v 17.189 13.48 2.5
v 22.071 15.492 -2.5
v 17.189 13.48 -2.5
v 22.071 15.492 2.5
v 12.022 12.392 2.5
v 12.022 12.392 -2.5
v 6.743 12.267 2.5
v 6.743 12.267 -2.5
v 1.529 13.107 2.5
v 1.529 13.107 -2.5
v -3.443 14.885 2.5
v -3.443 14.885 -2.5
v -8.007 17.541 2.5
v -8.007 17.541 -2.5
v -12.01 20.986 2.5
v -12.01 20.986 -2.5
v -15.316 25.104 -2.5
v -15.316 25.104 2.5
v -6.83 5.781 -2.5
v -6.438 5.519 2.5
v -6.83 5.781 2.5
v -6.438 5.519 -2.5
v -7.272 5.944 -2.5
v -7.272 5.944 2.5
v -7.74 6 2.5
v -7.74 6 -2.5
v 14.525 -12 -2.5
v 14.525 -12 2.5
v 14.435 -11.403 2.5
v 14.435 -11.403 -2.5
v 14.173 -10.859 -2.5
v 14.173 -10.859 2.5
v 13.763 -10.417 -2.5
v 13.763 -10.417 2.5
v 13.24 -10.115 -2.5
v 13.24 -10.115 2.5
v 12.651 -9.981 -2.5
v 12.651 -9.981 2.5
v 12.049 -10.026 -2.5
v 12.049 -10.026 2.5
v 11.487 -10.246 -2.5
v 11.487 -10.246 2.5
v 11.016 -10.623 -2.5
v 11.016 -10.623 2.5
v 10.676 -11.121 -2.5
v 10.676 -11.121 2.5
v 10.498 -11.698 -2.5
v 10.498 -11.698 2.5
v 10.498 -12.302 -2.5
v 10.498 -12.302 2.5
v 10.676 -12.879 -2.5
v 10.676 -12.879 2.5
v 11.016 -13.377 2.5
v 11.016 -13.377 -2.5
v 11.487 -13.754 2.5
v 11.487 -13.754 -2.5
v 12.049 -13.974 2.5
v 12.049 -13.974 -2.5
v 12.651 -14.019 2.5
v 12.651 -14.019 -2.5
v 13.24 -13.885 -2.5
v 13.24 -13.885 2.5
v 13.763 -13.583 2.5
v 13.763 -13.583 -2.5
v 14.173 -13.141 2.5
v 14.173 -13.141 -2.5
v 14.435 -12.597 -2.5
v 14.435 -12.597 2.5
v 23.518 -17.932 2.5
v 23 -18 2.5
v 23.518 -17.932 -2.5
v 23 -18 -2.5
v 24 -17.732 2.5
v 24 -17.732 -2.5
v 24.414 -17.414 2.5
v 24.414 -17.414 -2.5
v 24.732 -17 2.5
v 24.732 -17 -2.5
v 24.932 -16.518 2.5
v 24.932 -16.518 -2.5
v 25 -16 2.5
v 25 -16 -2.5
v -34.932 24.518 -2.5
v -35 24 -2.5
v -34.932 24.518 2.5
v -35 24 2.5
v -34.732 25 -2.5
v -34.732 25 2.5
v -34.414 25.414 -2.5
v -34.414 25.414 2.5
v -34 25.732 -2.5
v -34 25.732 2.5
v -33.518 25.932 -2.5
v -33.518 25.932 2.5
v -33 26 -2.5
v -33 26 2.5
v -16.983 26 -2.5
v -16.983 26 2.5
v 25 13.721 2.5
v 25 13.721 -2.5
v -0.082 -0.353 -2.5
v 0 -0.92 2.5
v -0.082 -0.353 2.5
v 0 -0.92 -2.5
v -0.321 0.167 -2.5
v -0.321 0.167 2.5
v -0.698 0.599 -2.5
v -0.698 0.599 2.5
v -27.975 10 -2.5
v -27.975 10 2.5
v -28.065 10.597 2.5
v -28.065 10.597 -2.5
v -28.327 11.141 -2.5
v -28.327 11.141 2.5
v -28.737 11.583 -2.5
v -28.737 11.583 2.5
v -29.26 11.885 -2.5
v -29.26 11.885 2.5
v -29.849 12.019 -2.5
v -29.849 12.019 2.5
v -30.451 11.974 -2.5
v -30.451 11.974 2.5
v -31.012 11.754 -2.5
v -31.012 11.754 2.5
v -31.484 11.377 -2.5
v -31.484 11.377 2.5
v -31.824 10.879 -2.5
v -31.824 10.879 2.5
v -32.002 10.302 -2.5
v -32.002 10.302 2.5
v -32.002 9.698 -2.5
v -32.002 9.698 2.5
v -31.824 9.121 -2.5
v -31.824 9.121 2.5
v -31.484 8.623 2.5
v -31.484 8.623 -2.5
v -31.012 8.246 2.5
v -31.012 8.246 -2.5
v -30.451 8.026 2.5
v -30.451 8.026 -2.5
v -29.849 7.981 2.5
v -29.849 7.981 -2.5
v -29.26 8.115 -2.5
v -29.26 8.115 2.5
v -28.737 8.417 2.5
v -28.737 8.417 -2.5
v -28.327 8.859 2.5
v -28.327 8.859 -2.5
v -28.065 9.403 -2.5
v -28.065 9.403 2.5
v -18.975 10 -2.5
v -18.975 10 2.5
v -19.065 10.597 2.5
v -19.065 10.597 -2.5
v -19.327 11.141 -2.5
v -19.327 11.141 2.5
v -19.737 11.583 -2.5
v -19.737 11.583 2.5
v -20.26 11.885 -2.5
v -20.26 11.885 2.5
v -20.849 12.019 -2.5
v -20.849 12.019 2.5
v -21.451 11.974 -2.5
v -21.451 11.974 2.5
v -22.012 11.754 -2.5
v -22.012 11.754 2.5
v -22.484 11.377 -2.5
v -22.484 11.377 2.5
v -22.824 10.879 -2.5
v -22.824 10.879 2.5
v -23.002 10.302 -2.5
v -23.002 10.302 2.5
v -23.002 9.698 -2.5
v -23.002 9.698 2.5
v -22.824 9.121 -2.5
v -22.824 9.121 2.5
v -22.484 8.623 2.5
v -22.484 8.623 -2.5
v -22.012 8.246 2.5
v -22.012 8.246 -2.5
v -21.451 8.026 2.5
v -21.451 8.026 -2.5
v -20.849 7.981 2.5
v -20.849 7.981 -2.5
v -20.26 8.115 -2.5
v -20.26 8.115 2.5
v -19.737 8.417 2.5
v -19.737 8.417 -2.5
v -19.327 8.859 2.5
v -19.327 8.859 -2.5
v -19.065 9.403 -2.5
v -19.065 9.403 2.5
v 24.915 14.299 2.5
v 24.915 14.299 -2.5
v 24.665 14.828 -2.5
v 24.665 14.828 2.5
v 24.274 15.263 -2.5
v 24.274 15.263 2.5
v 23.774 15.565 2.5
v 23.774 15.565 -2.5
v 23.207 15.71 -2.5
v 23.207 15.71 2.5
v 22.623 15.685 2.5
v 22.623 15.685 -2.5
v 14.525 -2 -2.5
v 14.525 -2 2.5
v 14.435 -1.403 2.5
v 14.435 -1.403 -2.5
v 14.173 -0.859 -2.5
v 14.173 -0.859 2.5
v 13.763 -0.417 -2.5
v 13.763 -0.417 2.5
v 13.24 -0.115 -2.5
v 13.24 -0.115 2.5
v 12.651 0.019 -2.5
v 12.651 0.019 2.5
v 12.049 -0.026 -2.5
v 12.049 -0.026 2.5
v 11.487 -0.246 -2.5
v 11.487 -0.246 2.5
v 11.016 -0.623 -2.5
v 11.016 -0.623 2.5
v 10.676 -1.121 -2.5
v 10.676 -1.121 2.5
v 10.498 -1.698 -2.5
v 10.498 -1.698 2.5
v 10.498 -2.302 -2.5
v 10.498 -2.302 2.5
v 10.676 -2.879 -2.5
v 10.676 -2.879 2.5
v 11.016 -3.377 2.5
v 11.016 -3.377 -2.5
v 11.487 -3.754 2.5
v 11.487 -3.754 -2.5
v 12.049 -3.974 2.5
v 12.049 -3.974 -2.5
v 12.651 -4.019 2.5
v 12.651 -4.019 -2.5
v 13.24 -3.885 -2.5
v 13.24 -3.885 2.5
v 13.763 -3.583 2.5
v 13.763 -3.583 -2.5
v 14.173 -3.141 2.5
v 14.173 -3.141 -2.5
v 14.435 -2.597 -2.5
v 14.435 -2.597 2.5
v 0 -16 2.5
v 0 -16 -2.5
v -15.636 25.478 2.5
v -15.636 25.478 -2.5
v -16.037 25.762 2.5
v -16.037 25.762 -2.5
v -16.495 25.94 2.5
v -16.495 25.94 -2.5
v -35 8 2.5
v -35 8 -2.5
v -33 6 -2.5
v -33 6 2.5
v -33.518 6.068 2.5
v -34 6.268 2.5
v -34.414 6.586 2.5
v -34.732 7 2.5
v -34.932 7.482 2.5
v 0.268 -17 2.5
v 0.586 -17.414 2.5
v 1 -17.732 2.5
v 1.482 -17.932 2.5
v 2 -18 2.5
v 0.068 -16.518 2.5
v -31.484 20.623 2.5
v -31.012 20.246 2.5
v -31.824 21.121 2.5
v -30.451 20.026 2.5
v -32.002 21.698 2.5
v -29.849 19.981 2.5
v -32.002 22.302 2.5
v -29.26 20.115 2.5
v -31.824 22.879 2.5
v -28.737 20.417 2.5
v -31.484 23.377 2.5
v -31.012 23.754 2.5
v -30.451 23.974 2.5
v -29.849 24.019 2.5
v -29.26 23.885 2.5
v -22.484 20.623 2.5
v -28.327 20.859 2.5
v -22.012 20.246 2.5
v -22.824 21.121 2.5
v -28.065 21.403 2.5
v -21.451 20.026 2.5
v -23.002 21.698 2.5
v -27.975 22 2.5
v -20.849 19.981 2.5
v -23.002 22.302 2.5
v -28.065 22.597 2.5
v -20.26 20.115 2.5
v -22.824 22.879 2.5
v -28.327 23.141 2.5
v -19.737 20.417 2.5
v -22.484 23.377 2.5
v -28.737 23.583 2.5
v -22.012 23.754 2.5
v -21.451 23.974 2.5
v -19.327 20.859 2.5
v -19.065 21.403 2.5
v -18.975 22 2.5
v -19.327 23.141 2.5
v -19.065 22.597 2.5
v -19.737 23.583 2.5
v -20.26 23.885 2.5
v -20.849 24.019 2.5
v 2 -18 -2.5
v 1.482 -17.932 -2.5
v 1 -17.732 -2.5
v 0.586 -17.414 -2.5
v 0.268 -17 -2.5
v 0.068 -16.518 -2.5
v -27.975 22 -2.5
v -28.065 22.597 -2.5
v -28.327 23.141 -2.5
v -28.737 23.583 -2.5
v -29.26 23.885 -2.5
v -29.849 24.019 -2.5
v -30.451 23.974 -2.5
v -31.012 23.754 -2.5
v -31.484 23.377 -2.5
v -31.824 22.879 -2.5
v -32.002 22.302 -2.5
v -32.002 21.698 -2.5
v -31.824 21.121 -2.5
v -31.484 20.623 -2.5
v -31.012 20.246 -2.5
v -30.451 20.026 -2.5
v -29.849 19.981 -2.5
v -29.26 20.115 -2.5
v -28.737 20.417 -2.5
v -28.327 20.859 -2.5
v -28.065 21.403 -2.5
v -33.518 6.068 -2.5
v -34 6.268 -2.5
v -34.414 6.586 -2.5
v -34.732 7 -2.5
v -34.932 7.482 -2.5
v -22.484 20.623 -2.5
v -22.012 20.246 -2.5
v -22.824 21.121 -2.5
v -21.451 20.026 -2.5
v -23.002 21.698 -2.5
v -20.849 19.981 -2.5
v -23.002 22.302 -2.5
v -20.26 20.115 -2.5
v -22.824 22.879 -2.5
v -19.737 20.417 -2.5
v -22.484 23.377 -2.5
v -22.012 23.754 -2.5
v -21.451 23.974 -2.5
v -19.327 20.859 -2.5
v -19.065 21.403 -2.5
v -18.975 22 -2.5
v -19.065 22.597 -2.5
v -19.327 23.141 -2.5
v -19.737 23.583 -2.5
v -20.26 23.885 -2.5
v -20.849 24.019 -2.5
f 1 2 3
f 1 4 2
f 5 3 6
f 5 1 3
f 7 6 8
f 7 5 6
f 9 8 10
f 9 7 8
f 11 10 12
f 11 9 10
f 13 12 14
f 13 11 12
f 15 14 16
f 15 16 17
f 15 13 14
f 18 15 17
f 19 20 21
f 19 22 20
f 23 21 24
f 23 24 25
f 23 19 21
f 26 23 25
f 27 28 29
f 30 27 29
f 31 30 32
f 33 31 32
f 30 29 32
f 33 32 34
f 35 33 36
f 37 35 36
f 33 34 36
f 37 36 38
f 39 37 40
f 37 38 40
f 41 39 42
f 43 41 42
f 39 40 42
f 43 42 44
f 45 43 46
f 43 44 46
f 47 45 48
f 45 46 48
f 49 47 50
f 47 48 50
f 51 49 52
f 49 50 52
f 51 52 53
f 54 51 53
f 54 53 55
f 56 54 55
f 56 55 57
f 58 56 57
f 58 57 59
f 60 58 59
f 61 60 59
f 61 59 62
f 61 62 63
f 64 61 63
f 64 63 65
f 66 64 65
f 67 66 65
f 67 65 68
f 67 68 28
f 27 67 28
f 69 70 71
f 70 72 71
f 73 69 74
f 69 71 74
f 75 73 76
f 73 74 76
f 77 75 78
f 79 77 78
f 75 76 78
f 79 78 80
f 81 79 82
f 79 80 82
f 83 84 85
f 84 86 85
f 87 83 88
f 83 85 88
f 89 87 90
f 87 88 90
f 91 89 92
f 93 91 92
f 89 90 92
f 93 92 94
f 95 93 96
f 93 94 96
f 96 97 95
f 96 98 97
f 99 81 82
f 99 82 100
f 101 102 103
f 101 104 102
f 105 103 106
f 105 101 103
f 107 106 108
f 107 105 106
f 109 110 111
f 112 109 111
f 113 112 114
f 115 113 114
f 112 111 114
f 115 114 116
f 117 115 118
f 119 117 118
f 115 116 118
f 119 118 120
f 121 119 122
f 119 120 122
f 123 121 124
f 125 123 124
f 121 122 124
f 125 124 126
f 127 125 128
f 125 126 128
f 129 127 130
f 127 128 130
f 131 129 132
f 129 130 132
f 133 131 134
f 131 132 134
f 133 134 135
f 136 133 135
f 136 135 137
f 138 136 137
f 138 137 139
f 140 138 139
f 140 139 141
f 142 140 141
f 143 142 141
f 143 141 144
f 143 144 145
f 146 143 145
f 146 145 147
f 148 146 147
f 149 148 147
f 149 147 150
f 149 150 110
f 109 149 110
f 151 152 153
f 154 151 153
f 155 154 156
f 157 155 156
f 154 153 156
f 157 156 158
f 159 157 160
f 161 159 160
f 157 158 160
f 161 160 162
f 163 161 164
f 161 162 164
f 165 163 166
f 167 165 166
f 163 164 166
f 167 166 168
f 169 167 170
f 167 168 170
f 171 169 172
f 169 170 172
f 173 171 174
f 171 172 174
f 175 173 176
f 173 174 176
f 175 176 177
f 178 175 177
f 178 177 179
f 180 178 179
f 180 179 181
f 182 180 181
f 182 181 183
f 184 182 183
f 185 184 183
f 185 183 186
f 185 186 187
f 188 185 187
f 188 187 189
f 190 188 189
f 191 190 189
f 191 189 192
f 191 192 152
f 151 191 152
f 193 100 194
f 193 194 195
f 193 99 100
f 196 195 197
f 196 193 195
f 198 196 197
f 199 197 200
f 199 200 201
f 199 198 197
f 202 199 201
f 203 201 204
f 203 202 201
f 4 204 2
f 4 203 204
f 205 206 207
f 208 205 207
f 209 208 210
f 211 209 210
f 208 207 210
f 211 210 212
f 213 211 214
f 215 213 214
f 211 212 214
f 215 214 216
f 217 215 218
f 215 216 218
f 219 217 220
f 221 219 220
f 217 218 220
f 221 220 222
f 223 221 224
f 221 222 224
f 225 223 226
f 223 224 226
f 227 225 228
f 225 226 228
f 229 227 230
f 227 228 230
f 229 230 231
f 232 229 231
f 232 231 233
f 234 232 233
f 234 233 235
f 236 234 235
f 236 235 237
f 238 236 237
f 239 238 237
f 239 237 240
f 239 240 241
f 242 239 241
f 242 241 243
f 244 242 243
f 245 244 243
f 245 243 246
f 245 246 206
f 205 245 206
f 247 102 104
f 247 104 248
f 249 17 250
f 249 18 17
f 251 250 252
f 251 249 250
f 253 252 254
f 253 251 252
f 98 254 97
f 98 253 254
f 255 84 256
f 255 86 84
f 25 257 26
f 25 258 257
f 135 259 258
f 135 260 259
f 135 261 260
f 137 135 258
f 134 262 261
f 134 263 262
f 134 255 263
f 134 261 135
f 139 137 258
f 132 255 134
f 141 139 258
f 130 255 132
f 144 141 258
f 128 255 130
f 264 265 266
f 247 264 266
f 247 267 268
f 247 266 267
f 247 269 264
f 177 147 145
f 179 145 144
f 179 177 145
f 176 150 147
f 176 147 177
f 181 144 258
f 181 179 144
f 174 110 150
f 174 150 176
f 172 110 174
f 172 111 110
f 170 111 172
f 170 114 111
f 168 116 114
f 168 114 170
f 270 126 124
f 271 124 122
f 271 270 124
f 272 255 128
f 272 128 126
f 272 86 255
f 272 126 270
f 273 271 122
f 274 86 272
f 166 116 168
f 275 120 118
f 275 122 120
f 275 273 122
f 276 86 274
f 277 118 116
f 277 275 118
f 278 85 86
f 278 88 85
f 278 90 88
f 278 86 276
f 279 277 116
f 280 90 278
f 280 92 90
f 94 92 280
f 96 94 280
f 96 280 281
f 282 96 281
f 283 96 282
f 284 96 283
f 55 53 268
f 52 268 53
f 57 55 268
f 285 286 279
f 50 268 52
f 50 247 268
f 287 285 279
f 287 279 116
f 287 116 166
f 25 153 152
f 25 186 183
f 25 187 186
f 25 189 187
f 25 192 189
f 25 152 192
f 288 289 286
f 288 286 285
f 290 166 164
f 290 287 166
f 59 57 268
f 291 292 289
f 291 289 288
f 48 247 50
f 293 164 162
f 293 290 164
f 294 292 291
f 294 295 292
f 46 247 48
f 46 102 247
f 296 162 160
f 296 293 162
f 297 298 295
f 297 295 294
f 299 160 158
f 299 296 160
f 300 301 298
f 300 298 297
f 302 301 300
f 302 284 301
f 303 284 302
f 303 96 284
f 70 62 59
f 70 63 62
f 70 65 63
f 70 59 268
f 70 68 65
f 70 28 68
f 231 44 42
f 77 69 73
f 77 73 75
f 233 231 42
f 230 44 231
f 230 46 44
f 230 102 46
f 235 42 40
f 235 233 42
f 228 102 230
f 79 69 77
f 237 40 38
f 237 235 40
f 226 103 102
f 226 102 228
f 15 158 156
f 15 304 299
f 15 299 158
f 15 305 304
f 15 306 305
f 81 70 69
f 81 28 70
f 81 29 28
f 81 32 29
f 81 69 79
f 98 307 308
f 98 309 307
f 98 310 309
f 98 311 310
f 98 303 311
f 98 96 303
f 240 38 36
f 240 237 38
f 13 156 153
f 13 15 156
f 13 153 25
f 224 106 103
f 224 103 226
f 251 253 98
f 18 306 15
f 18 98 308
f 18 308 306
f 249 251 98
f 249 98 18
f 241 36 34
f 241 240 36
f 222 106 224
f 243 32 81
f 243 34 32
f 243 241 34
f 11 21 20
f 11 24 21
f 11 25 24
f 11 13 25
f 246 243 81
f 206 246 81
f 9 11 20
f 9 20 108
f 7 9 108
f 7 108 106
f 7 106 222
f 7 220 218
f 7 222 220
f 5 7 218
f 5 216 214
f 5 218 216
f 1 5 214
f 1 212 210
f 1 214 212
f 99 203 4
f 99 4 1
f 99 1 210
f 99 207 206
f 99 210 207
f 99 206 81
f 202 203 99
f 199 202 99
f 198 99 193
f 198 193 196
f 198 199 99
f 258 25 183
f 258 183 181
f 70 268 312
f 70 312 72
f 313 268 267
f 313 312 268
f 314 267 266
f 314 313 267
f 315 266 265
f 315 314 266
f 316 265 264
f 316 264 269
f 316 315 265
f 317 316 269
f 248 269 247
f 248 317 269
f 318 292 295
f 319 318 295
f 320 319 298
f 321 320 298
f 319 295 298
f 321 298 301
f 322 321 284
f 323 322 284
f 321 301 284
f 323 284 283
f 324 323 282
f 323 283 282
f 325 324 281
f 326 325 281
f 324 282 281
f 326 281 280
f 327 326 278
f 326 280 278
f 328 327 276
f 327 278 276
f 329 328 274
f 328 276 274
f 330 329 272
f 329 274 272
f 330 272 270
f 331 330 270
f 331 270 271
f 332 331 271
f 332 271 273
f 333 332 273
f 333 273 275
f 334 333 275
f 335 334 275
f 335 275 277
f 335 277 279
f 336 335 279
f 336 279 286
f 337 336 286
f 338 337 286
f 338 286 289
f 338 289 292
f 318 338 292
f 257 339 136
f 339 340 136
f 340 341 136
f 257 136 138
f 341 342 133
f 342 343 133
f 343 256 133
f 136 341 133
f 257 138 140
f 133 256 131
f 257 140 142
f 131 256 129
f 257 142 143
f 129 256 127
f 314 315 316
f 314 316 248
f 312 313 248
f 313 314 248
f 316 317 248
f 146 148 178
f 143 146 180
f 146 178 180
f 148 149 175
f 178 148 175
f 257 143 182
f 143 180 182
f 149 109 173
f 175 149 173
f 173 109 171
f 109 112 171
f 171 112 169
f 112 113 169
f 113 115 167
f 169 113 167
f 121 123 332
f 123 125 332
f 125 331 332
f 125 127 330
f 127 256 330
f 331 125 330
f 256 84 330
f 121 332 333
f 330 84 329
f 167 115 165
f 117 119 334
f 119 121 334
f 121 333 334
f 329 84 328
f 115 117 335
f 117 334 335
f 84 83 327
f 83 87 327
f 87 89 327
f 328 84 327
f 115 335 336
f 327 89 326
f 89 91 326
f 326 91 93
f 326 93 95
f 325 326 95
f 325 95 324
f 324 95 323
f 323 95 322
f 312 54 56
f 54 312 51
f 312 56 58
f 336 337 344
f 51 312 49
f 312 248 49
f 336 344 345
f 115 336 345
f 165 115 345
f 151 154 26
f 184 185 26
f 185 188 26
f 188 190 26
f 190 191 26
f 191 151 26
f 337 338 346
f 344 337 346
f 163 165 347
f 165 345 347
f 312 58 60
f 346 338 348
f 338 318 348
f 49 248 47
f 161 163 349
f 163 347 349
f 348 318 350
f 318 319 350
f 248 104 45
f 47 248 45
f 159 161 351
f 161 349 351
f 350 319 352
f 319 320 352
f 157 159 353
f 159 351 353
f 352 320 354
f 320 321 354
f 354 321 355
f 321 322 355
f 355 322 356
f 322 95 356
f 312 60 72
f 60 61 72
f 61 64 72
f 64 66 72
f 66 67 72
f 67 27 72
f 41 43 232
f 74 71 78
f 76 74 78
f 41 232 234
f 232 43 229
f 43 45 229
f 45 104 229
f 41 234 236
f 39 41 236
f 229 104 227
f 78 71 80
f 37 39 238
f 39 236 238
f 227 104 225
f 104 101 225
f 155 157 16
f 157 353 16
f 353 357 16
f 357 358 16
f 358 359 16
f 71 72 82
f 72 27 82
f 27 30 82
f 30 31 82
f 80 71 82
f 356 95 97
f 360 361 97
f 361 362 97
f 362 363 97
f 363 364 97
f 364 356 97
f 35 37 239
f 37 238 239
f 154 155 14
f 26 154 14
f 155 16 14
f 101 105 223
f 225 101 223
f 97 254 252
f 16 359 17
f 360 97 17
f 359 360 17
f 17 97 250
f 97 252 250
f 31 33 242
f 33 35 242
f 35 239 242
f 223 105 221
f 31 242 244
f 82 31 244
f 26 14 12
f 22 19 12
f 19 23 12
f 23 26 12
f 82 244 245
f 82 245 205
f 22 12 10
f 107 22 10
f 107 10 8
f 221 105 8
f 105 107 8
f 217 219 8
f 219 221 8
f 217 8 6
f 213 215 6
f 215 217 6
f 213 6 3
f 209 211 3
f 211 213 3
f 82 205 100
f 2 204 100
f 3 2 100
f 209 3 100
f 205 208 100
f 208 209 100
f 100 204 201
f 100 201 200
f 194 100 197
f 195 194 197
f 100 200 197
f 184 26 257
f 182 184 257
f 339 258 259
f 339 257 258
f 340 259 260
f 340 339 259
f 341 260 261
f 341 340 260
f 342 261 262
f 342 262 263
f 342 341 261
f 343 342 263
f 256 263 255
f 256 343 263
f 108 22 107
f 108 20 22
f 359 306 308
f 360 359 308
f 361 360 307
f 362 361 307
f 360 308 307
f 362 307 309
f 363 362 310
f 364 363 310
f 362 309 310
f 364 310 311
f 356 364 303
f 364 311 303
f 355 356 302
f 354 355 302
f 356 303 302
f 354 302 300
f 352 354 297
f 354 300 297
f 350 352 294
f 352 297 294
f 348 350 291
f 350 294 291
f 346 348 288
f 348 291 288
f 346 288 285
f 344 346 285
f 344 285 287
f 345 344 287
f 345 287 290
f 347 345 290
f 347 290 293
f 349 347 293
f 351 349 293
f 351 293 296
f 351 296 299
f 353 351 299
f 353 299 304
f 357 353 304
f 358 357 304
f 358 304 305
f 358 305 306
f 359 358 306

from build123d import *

# Parameters (mm, degrees)
EXTRUDE_1_DEPTH          = 2.5
FILLET_1_R               = 2
FILLET_2_R               = 2
SKETCH_2_R               = 2.025
CUT_EXTRUDE_1_DEPTH      = 6
SKETCH_3_W               = 25
SKETCH_3_H               = 6
CUT_EXTRUDE_2_DEPTH      = 6
FILLET_3_R               = 2
SKETCH_4_R               = 2.025
CUT_EXTRUDE_3_DEPTH      = 1
CUT_EXTRUDE_3_DEPTH_BACK = 6
SKETCH_5_R               = 2.025
CUT_EXTRUDE_4_DEPTH      = 1
CUT_EXTRUDE_4_DEPTH_BACK = 6


with BuildPart() as part:
    # 草图1 → 凸台-拉伸1 (new body, symmetric)
    with BuildSketch(Plane.XY):
        with BuildLine():
            Line((0, 0), (0, -24))
            Line((0, -24), (25, -24))
            Line((25, -24), (25, 17.256579859))
            ThreePointArc((25, 17.256579859), (2.677238779, 12.836790892), (-15.885361498, 26))
            Line((-15.885361498, 26), (-35, 26))
            Line((-35, 26), (-35, 6))
            Line((-35, 6), (-7, 6))
            Line((-7, 6), (0, 0))
        make_face()
    extrude(amount=EXTRUDE_1_DEPTH, both=True)

    # 圆角1
    fillet_1_edges = [part.edges().sort_by_distance(p)[0] for p in [
        (-7, 6, 0),
        (-35, 6, 0),
        (-35, 26, 0),
        (25, -24, 0),
        (0, -24, 0),
        (0, 0, 0),
    ]]
    fillet(fillet_1_edges, radius=FILLET_1_R)

    # 圆角2
    fillet_2_edges = [part.edges().sort_by_distance(p)[0] for p in [
        (-15.885361498, 26, 0),
        (25, 17.256579859, 0),
    ]]
    fillet(fillet_2_edges, radius=FILLET_2_R)

    # 草图2 → 切除-拉伸1 (cut, through all)
    with BuildSketch(Plane.XY.offset(2.5)):
        with Locations((12.5, -2)):
            Circle(SKETCH_2_R)
        with Locations((12.5, -12)):
            Circle(SKETCH_2_R)
    extrude(amount=-CUT_EXTRUDE_1_DEPTH, mode=Mode.SUBTRACT)

    # 草图3 → 切除-拉伸2 (cut, through all)
    with BuildSketch(Plane.XY.offset(2.5)):
        with Locations((12.5, -21)):
            Rectangle(SKETCH_3_W, SKETCH_3_H)
    extrude(amount=-CUT_EXTRUDE_2_DEPTH, mode=Mode.SUBTRACT)

    # 圆角3
    fillet_3_edges = [part.edges().sort_by_distance(p)[0] for p in [
        (0, -18, 0),
        (25, -18, 0),
    ]]
    fillet(fillet_3_edges, radius=FILLET_3_R)

    # 草图4 → 切除-拉伸3 (cut, two sides)
    with BuildSketch(Plane.XY.offset(2.5)) as cut_extrude_3_sk:
        with Locations((-30, 22)):
            Circle(SKETCH_4_R)
        with Locations((-30, 10)):
            Circle(SKETCH_4_R)
    extrude(amount=CUT_EXTRUDE_3_DEPTH, mode=Mode.SUBTRACT)
    extrude(cut_extrude_3_sk.sketch, amount=-CUT_EXTRUDE_3_DEPTH_BACK, mode=Mode.SUBTRACT)

    # 草图5 → 切除-拉伸4 (cut, two sides)
    with BuildSketch(Plane.XY.offset(2.5)) as cut_extrude_4_sk:
        with Locations((-21, 10)):
            Circle(SKETCH_5_R)
        with Locations((-21, 22)):
            Circle(SKETCH_5_R)
    extrude(amount=CUT_EXTRUDE_4_DEPTH, mode=Mode.SUBTRACT)
    extrude(cut_extrude_4_sk.sketch, amount=-CUT_EXTRUDE_4_DEPTH_BACK, mode=Mode.SUBTRACT)


solid = part.part
